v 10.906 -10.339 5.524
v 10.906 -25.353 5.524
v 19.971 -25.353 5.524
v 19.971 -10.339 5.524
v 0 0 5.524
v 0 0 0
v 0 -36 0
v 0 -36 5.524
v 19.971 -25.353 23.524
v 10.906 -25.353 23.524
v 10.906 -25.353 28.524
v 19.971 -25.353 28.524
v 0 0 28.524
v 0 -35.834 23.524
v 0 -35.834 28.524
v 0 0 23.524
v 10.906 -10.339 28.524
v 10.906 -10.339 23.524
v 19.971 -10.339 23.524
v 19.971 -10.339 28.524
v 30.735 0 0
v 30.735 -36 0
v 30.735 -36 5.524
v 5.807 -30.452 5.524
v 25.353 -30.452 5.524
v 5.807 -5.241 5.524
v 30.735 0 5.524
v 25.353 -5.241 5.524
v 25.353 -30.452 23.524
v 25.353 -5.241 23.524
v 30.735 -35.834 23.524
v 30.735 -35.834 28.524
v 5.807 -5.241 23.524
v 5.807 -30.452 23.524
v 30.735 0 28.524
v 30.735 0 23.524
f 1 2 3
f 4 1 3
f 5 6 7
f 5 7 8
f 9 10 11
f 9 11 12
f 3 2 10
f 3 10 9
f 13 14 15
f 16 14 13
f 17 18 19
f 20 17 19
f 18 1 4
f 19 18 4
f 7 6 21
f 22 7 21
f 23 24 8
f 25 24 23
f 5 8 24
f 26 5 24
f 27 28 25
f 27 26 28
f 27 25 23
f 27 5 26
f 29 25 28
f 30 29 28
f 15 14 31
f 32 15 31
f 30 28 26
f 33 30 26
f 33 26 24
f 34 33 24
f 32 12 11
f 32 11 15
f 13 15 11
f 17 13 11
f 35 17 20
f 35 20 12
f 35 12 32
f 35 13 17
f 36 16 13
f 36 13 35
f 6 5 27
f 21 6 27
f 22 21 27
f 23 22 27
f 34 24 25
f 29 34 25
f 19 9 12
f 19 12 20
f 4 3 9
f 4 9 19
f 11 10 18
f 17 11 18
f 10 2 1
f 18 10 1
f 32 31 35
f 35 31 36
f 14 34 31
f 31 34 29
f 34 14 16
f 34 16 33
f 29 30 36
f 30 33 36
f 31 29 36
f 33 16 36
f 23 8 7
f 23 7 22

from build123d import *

# Parameters (mm, degrees)
F0_W     = 30.7351611555
F0_H     = 5.5238311179
F1_DEPTH = 36
F3_DEPTH = 18
F4_W     = 30.7351611555
F4_H     = 35.8340851963
F4_W_2   = 9.0647470206
F4_H_2   = 15.0134908035
F5_DEPTH = 5


with BuildPart() as f1:
    # F0 (on Front) → F1 (new body)
    with BuildSketch(Plane.XZ):
        with Locations((15.3675805777, 2.7619155589)):
            Rectangle(F0_W, F0_H)
    extrude(amount=F1_DEPTH)

    # F2 (on face) → F3 (join)
    with BuildSketch(Plane.XY.offset(5.5238311179)):
        Polygon((25.3529716283, -30.4518900812), (25.3529716283, -18), (25.3529716283, -5.2405577153), (5.8071063831, -5.2405577153), (5.8071063831, -30.4518900812), align=None)
        Polygon((19.9707727879, -25.3529697657), (15.5800390057, -25.3529697657), (10.9060257673, -25.3529697657), (10.9060257673, -10.3394789621), (19.9707727879, -10.3394789621), align=None, mode=Mode.SUBTRACT)
    extrude(amount=F3_DEPTH)

    # F4 (on face) → F5 (join)
    with BuildSketch(Plane.XY.offset(23.5238311179)):
        with Locations((15.3675805777, -17.9170425981)):
            Rectangle(F4_W, F4_H)
        with Locations((15.4383992776, -17.8462243639)):
            Rectangle(F4_W_2, F4_H_2, mode=Mode.SUBTRACT)
    extrude(amount=F5_DEPTH)


solid = f1.part
